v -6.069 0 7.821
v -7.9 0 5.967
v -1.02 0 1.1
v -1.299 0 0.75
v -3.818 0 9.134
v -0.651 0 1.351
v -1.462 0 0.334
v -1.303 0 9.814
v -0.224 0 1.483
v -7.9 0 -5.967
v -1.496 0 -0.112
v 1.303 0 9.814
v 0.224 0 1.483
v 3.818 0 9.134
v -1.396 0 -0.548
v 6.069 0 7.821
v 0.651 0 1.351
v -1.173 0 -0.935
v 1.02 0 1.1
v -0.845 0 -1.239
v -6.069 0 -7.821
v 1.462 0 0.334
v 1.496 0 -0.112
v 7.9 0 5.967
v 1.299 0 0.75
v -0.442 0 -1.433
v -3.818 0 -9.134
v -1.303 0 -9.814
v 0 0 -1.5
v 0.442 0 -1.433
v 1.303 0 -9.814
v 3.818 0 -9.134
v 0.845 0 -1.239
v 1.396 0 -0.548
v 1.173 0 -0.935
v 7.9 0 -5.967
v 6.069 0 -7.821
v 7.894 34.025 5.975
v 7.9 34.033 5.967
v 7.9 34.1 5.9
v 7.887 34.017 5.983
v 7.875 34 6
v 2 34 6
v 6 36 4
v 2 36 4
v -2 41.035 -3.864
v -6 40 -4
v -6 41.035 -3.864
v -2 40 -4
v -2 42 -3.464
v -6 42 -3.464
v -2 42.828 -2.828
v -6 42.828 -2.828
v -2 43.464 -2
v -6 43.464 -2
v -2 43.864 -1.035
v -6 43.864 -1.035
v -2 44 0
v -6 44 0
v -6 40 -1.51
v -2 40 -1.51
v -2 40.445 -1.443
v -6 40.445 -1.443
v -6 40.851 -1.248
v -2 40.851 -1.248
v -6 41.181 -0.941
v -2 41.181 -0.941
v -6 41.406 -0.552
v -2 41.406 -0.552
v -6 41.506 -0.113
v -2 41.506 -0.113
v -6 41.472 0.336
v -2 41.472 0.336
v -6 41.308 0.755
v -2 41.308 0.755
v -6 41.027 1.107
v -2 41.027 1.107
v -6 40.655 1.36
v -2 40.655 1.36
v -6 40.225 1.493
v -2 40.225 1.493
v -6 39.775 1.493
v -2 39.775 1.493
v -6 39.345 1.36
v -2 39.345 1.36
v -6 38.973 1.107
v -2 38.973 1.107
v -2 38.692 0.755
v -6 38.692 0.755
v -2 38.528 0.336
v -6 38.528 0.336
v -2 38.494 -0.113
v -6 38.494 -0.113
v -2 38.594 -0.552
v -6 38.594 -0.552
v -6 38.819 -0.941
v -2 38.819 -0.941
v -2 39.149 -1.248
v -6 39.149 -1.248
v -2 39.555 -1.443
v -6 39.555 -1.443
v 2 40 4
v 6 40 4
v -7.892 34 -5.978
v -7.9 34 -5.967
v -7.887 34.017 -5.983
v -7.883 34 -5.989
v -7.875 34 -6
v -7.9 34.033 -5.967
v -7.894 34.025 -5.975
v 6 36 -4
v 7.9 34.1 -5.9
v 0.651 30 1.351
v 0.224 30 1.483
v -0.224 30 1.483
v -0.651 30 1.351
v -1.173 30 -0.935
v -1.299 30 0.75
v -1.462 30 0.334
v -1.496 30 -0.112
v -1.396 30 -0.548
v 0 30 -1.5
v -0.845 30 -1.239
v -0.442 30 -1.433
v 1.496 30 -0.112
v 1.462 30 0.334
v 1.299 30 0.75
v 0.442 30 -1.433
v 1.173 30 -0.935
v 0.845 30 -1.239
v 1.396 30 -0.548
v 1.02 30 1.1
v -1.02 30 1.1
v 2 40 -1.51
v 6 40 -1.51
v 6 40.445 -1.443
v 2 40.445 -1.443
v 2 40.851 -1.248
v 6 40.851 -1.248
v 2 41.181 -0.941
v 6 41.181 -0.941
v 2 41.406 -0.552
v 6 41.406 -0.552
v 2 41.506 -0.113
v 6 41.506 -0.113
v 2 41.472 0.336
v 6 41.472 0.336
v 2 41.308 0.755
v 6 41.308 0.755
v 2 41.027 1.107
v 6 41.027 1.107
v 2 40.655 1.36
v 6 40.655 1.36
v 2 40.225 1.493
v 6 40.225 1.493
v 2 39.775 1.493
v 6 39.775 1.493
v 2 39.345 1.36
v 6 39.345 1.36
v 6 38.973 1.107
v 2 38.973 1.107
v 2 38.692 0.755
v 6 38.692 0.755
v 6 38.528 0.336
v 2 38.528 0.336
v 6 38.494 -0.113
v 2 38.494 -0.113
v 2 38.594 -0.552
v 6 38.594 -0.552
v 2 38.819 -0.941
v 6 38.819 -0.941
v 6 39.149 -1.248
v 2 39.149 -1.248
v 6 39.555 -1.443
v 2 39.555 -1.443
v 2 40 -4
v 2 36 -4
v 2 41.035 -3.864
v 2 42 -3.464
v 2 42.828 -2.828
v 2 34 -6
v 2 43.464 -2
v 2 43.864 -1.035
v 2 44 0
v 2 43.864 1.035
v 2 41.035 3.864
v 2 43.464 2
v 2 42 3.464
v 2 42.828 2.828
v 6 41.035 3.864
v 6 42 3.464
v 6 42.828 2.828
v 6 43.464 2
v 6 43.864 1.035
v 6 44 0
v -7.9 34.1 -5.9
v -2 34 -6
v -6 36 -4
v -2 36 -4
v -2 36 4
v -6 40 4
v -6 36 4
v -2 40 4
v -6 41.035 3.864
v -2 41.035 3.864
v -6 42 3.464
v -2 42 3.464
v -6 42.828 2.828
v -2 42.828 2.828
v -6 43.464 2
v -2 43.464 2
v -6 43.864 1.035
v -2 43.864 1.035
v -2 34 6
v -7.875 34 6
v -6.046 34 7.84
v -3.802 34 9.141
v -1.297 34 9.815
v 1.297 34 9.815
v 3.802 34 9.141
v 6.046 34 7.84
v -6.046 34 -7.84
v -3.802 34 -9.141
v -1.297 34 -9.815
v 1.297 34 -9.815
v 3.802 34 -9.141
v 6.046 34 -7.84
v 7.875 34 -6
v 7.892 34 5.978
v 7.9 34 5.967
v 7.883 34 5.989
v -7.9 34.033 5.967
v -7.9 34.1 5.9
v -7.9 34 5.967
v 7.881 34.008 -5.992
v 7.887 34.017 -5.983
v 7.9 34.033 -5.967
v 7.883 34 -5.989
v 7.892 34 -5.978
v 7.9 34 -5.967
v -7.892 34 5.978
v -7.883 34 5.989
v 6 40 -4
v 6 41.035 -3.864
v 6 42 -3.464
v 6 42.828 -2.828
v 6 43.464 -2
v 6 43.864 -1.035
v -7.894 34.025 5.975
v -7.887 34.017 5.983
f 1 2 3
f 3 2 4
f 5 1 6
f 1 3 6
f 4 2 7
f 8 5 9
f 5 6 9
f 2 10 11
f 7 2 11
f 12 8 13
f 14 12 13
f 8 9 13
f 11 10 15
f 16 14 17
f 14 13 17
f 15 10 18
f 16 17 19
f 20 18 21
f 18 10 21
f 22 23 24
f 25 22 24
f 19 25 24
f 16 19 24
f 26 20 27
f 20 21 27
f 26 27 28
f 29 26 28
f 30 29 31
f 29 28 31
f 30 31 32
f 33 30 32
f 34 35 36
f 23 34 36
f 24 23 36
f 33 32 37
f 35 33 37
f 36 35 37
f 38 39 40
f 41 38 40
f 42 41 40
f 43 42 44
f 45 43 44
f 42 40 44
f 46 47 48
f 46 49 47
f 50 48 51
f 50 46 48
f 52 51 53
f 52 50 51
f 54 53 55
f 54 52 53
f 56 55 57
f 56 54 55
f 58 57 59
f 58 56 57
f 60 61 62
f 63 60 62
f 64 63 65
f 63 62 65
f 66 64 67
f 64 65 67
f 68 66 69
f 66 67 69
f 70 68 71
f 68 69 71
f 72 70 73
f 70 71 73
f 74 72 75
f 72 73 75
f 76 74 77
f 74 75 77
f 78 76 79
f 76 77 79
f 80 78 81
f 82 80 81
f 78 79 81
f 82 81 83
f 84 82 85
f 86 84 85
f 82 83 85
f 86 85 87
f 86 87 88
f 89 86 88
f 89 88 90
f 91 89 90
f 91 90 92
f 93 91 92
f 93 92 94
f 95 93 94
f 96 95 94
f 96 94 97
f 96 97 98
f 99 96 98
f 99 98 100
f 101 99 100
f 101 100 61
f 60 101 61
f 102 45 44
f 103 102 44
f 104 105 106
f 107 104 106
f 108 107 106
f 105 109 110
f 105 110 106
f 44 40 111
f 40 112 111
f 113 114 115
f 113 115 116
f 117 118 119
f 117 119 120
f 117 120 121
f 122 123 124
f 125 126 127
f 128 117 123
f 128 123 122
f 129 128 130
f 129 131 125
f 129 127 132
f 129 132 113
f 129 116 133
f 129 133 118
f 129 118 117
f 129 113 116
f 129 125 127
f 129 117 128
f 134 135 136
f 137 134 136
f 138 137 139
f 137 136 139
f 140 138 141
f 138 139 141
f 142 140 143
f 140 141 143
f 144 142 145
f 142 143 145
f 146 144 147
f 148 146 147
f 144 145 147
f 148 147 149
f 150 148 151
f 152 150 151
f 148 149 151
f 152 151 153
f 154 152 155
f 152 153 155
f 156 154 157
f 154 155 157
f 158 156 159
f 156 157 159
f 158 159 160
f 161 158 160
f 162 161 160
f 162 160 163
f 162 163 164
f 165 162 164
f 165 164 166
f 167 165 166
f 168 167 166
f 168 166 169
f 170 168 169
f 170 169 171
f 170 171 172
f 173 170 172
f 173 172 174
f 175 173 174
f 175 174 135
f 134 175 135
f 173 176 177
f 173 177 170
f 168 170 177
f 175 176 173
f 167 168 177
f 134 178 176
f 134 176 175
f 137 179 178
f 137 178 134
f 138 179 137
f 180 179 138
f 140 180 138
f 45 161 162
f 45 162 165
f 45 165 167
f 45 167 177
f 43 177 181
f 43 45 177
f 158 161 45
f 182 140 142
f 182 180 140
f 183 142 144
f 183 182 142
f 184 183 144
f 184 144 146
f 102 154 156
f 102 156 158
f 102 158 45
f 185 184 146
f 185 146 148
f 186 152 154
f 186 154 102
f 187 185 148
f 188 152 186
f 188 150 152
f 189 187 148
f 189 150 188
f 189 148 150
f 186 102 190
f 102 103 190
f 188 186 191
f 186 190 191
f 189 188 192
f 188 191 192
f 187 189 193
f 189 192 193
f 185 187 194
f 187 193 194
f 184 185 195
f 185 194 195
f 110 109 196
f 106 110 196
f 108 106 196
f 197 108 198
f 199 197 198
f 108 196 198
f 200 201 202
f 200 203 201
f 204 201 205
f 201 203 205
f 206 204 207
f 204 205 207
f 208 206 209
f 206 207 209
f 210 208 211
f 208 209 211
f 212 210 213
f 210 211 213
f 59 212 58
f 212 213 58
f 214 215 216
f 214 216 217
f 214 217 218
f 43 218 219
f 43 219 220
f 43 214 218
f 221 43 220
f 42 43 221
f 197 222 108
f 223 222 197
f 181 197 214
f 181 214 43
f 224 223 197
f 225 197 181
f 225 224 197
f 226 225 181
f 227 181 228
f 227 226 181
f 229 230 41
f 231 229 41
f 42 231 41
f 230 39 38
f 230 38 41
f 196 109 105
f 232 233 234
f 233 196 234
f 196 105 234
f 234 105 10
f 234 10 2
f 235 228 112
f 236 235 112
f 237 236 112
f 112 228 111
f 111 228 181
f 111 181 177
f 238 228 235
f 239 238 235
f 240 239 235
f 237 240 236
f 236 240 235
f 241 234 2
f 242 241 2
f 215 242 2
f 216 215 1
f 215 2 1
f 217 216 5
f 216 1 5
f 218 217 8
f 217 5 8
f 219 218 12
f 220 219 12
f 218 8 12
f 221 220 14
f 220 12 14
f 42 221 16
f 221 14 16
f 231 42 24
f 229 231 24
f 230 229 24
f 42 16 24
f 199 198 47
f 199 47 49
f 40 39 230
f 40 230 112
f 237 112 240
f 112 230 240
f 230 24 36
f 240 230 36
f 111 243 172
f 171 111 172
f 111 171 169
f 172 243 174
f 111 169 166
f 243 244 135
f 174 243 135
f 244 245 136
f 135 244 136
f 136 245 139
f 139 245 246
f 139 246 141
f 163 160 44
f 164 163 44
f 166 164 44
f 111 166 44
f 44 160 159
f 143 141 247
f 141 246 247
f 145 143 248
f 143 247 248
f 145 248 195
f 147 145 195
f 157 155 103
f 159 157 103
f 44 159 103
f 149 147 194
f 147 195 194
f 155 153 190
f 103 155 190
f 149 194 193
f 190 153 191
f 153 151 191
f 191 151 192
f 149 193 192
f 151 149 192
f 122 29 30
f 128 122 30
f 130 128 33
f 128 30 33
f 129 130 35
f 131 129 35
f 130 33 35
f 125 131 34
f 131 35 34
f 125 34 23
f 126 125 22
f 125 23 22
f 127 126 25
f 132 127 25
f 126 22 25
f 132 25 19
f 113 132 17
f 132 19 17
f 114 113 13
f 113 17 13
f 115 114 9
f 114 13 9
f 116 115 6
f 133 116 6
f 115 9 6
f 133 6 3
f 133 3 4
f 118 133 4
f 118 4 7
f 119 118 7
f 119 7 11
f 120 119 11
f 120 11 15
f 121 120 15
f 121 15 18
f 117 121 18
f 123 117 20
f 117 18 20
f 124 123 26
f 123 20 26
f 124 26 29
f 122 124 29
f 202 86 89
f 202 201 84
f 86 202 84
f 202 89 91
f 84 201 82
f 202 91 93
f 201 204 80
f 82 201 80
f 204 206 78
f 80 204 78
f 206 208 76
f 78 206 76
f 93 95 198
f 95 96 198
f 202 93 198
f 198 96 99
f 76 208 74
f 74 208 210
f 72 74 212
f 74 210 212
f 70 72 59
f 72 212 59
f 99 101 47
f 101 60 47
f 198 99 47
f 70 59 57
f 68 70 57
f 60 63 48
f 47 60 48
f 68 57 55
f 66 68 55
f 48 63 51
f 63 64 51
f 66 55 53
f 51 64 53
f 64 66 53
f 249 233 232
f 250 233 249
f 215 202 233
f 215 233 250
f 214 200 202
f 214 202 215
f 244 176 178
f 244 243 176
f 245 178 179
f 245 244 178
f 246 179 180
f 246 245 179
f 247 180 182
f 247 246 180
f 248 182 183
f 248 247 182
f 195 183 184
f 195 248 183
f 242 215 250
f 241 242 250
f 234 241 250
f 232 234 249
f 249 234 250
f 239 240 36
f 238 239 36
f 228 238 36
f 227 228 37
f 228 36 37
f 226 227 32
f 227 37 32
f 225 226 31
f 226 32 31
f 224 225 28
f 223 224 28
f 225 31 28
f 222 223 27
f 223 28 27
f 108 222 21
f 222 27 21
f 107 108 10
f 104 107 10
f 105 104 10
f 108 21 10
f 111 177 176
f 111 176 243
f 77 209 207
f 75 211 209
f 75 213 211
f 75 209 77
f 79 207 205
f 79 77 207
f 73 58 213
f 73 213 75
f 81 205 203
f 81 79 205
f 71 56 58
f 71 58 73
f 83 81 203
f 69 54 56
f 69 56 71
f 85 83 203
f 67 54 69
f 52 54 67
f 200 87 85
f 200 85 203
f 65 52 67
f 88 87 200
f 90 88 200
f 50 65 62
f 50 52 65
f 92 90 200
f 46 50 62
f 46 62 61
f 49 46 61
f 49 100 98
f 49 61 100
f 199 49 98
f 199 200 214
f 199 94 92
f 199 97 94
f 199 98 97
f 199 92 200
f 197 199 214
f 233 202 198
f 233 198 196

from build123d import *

# Parameters (mm, degrees)
BOSS_EXTRUDE1_DEPTH = 34
SKETCH7_W           = 4
SKETCH7_H           = 8
BOSS_EXTRUDE3_DEPTH = 10
SKETCH9_R           = 1.51
CUT_EXTRUDE5_DEPTH  = 48.193431746
FILLET2_R           = 4
SKETCH16_R          = 1.5
CUT_EXTRUDE7_DEPTH  = 30
CHAMFER1_SIZE       = 2


# Some blends are built 0.0001 mm under size
with BuildPart() as part:
    # Sketch1 → Boss-Extrude1 (new body)
    with BuildSketch(Plane(origin=(0, 0, 0), x_dir=(1, 0, 0), z_dir=(0, 1, 0))):
        with BuildLine():
            Line((-7.9, 5.966573556), (-7.9, -5.966573556))
            ThreePointArc((-7.9, -5.966573556), (0, -9.9), (7.9, -5.966573556))
            Line((7.9, -5.966573556), (7.9, 5.966573556))
            ThreePointArc((7.9, 5.966573556), (0, 9.9), (-7.9, 5.966573556))
        make_face()
    extrude(amount=BOSS_EXTRUDE1_DEPTH)

    # Sketch7 → Boss-Extrude3 (add)
    with BuildSketch(Plane(origin=(0, 34, 0), x_dir=(1, 0, 0), z_dir=(0, 1, 0))):
        with Locations((-4, 0)):
            Rectangle(SKETCH7_W, SKETCH7_H)
        with Locations((4, 0)):
            Rectangle(SKETCH7_W, SKETCH7_H)
    extrude(amount=BOSS_EXTRUDE3_DEPTH)

    # Sketch9 → Cut-Extrude5 (cut, through all)
    with BuildSketch(Plane(origin=(6, 0, 0), x_dir=(0, 0, -1), z_dir=(1, 0, 0))):
        with Locations((0, 40)):
            Circle(SKETCH9_R)
    extrude(amount=-CUT_EXTRUDE5_DEPTH, mode=Mode.SUBTRACT)

    # Fillet2
    fillet2_edges = [part.edges().sort_by_distance(p)[0] for p in [
        (4, 44, 4),
        (4, 44, -4),
        (-4, 44, -4),
        (-4, 44, 4),
    ]]
    fillet(fillet2_edges, radius=FILLET2_R - 0.0001)  # a hair under: the kernel refuses the full size

    # Sketch16 → Cut-Extrude7 (cut)
    with BuildSketch(Plane.XZ):
        with Locations(Location((0, 0, 0), (0, 0, 270))):
            Circle(SKETCH16_R)
    extrude(amount=-CUT_EXTRUDE7_DEPTH, mode=Mode.SUBTRACT)

    # Chamfer1
    # the kernel refuses this chamfer: 2 mm, written as the material it adds along each edge
    with BuildSketch(Plane(origin=(-6, 34, -4), x_dir=(0, -0.027495876610585623, -0.9996219169112968), z_dir=(1, 0, 0)), Plane(origin=(2, 34, -4), x_dir=(0, -0.027495876610585623, -0.9996219169112968), z_dir=(1, 0, 0)), Plane(origin=(6, 34, 4), x_dir=(0, -0.027495876610585623, 0.9996219169112968), z_dir=(-1, 0, 0))) as chamfer1_piece_1:
        Polygon((CHAMFER1_SIZE * 0.999621916911, CHAMFER1_SIZE * 0.0274958766106), (-CHAMFER1_SIZE * 0.0274958766106, CHAMFER1_SIZE * 0.999621916911), (0, 0), align=None)
    extrude(amount=4)
    with BuildSketch(Plane(origin=(-6, 34, -4), x_dir=(0, -0.027495876610585623, -0.9996219169112968), z_dir=(1, 0, 0))) as chamfer1_piece_2_section:
        Polygon((CHAMFER1_SIZE * 0.999621916911, CHAMFER1_SIZE * 0.0274958766106), (-CHAMFER1_SIZE * 0.0274958766106, CHAMFER1_SIZE * 0.999621916911), (0, 0), align=None)
    chamfer1_piece_2 = extrude(amount=9.143365976, mode=Mode.PRIVATE)
    chamfer1_piece_2 = split(chamfer1_piece_2, bisect_by=Plane(origin=(2, 34.659587254, -4.659587254), z_dir=(1, 0, 0)), keep=Keep.TOP, mode=Mode.PRIVATE)
    add(chamfer1_piece_2)
    with BuildSketch(Plane(origin=(-6, 34, 4), x_dir=(0.02749587661058651, 0.9996219169112968, 0), z_dir=(0, 0, -1))) as chamfer1_piece_3_section:
        Polygon((CHAMFER1_SIZE * 0.999621916911, -CHAMFER1_SIZE * 0.0274958766106), (-CHAMFER1_SIZE * 0.0274958766106, -CHAMFER1_SIZE * 0.999621916911), (0, 0), align=None)
    chamfer1_piece_3 = extrude(amount=8, mode=Mode.PRIVATE)
    chamfer1_piece_3 = split(chamfer1_piece_3, bisect_by=Plane(origin=(-7.9, 34.66508919, 0), z_dir=(1, 0, 0)), keep=Keep.TOP, mode=Mode.PRIVATE)
    add(chamfer1_piece_3)
    with BuildSketch(Plane(origin=(3.143365976, 34, 4), x_dir=(0, 0.9996219169112968, -0.027495876610586296), z_dir=(-1, 0, 0))) as chamfer1_piece_4_section:
        Polygon((CHAMFER1_SIZE * 0.999621916911, -CHAMFER1_SIZE * 0.0274958766106), (-CHAMFER1_SIZE * 0.0274958766106, -CHAMFER1_SIZE * 0.999621916911), (0, 0), align=None)
    chamfer1_piece_4 = extrude(amount=9.143365976, mode=Mode.PRIVATE)
    chamfer1_piece_4 = split(chamfer1_piece_4, bisect_by=Plane(origin=(2, 34.659587254, 4.659587254), z_dir=(1, 0, 0)), keep=Keep.TOP, mode=Mode.PRIVATE)
    add(chamfer1_piece_4)
    with BuildSketch(Plane(origin=(-2, 34, 4), x_dir=(0, 0.9996219169112968, -0.027495876610586296), z_dir=(-1, 0, 0))) as chamfer1_piece_5:
        Polygon((CHAMFER1_SIZE * 0.999621916911, -CHAMFER1_SIZE * 0.0274958766106), (-CHAMFER1_SIZE * 0.0274958766106, -CHAMFER1_SIZE * 0.999621916911), (0, 0), align=None)
    extrude(amount=4)
    with BuildSketch(Plane(origin=(-3.143365976, 34, -4), x_dir=(0, -0.027495876610585623, -0.9996219169112968), z_dir=(1, 0, 0))) as chamfer1_piece_6_section:
        Polygon((CHAMFER1_SIZE * 0.999621916911, CHAMFER1_SIZE * 0.0274958766106), (-CHAMFER1_SIZE * 0.0274958766106, CHAMFER1_SIZE * 0.999621916911), (0, 0), align=None)
    chamfer1_piece_6 = extrude(amount=9.143365976, mode=Mode.PRIVATE)
    chamfer1_piece_6 = split(chamfer1_piece_6, bisect_by=Plane(origin=(-2, 34.659587254, -4.659587254), z_dir=(-1, 0, 0)), keep=Keep.TOP, mode=Mode.PRIVATE)
    add(chamfer1_piece_6)
    with BuildSketch(Plane(origin=(6, 34, 4), x_dir=(0, -0.027495876610585623, 0.9996219169112968), z_dir=(-1, 0, 0))) as chamfer1_piece_7_section:
        Polygon((CHAMFER1_SIZE * 0.999621916911, CHAMFER1_SIZE * 0.0274958766106), (-CHAMFER1_SIZE * 0.0274958766106, CHAMFER1_SIZE * 0.999621916911), (0, 0), align=None)
    chamfer1_piece_7 = extrude(amount=9.143365976, mode=Mode.PRIVATE)
    chamfer1_piece_7 = split(chamfer1_piece_7, bisect_by=Plane(origin=(-2, 34.659587254, 4.659587254), z_dir=(-1, 0, 0)), keep=Keep.TOP, mode=Mode.PRIVATE)
    add(chamfer1_piece_7)
    with BuildSketch(Plane(origin=(6, 34, -4), x_dir=(0.9996219169112968, -0.027495876610585623, 0), z_dir=(0, 0, 1))) as chamfer1_piece_8_section:
        Polygon((CHAMFER1_SIZE * 0.999621916911, CHAMFER1_SIZE * 0.0274958766106), (-CHAMFER1_SIZE * 0.0274958766106, CHAMFER1_SIZE * 0.999621916911), (0, 0), align=None)
    chamfer1_piece_8 = extrude(amount=8, mode=Mode.PRIVATE)
    chamfer1_piece_8 = split(chamfer1_piece_8, bisect_by=Plane(origin=(7.9, 34.66508919, 0), z_dir=(-1, 0, 0)), keep=Keep.TOP, mode=Mode.PRIVATE)
    add(chamfer1_piece_8)
    with BuildSketch(Plane(origin=(-6, 34, 4), x_dir=(0.02749587661058651, 0.9996219169112968, 0), z_dir=(0, 0, -1))) as chamfer1_piece_9a_section:
        Polygon((CHAMFER1_SIZE * 0.999621916911, -CHAMFER1_SIZE * 0.0274958766106), (-CHAMFER1_SIZE * 0.0274958766106, -CHAMFER1_SIZE * 0.999621916911), (0, 0), align=None)
    chamfer1_piece_9a = extrude(amount=13.143365976, mode=Mode.PRIVATE)
    chamfer1_piece_9a = split(chamfer1_piece_9a, bisect_by=Plane(origin=(-6.579477658, 34.702229701, -4), z_dir=(0, 0, -1)), keep=Keep.TOP, mode=Mode.PRIVATE)
    chamfer1_piece_9a = chamfer1_piece_9a & Plane(origin=(0, 34.702229701, 0), x_dir=(-0.7979797979797981, 0, 0.6026841975828805), z_dir=(0, -1, 0)) * Cylinder(9.9, 35, mode=Mode.PRIVATE)
    chamfer1_piece_9a = split(chamfer1_piece_9a, bisect_by=Plane(origin=(-7.9, 34.702229701, -5.684853753), z_dir=(1, 0, 0)), keep=Keep.TOP, mode=Mode.PRIVATE)
    with BuildSketch(Plane(origin=(-11.143365976, 34, -4), x_dir=(0, -0.027495876610585623, -0.9996219169112968), z_dir=(1, 0, 0))) as chamfer1_piece_9b_section:
        Polygon((CHAMFER1_SIZE * 0.999621916911, CHAMFER1_SIZE * 0.0274958766106), (-CHAMFER1_SIZE * 0.0274958766106, CHAMFER1_SIZE * 0.999621916911), (0, 0), align=None)
    chamfer1_piece_9b = extrude(amount=9.143365976, mode=Mode.PRIVATE)
    chamfer1_piece_9b = split(chamfer1_piece_9b, bisect_by=Plane(origin=(-6, 34.659622918, -4.659519528), z_dir=(-1, 0, 0)), keep=Keep.TOP, mode=Mode.PRIVATE)
    chamfer1_piece_9b = split(chamfer1_piece_9b, bisect_by=Plane(origin=(-7.9, 34.659622918, -4.659519528), z_dir=(1, 0, 0)), keep=Keep.TOP, mode=Mode.PRIVATE)
    chamfer1_piece_9b = chamfer1_piece_9b & Plane(origin=(0, 34.659622918, 0), x_dir=(0.7979797979797981, 0, -0.6026841975828805), z_dir=(0, -1, 0)) * Cylinder(9.9, 27, mode=Mode.PRIVATE)
    chamfer1_piece_9 = chamfer1_piece_9a & chamfer1_piece_9b
    add(chamfer1_piece_9)
    with BuildSketch(Plane(origin=(-6, 34, 9.143365976), x_dir=(0.02749587661058651, 0.9996219169112968, 0), z_dir=(0, 0, -1))) as chamfer1_piece_10a_section:
        Polygon((CHAMFER1_SIZE * 0.999621916911, -CHAMFER1_SIZE * 0.0274958766106), (-CHAMFER1_SIZE * 0.0274958766106, -CHAMFER1_SIZE * 0.999621916911), (0, 0), align=None)
    chamfer1_piece_10a = extrude(amount=13.143365976, mode=Mode.PRIVATE)
    chamfer1_piece_10a = split(chamfer1_piece_10a, bisect_by=Plane(origin=(-6.579477657, 34.702229707, 4), z_dir=(0, 0, 1)), keep=Keep.TOP, mode=Mode.PRIVATE)
    chamfer1_piece_10a = chamfer1_piece_10a & Plane(origin=(0, 34.702229707, 0), x_dir=(-0.7979797979797981, 0, 0.6026841975828805), z_dir=(0, -1, 0)) * Cylinder(9.9, 35, mode=Mode.PRIVATE)
    chamfer1_piece_10a = split(chamfer1_piece_10a, bisect_by=Plane(origin=(-7.9, 34.702229707, 5.684853748), z_dir=(1, 0, 0)), keep=Keep.TOP, mode=Mode.PRIVATE)
    with BuildSketch(Plane(origin=(-2, 34, 4), x_dir=(0, 0.9996219169112968, -0.027495876610586296), z_dir=(-1, 0, 0))) as chamfer1_piece_10b_section:
        Polygon((CHAMFER1_SIZE * 0.999621916911, -CHAMFER1_SIZE * 0.0274958766106), (-CHAMFER1_SIZE * 0.0274958766106, -CHAMFER1_SIZE * 0.999621916911), (0, 0), align=None)
    chamfer1_piece_10b = extrude(amount=9.143365976, mode=Mode.PRIVATE)
    chamfer1_piece_10b = split(chamfer1_piece_10b, bisect_by=Plane(origin=(-6, 34.659622918, 4.659519528), z_dir=(-1, 0, 0)), keep=Keep.TOP, mode=Mode.PRIVATE)
    chamfer1_piece_10b = chamfer1_piece_10b & Plane(origin=(0, 34.659622918, 0), x_dir=(-0.7979797979797981, 0, 0.6026841975828805), z_dir=(0, -1, 0)) * Cylinder(9.9, 27, mode=Mode.PRIVATE)
    chamfer1_piece_10b = split(chamfer1_piece_10b, bisect_by=Plane(origin=(-7.9, 34.659622918, 4.659519528), z_dir=(1, 0, 0)), keep=Keep.TOP, mode=Mode.PRIVATE)
    chamfer1_piece_10 = chamfer1_piece_10a & chamfer1_piece_10b
    add(chamfer1_piece_10)
    with BuildSketch(Plane(origin=(6, 34, -9.143365976), x_dir=(0.9996219169112968, -0.027495876610585623, 0), z_dir=(0, 0, 1))) as chamfer1_piece_11a_section:
        Polygon((CHAMFER1_SIZE * 0.999621916911, CHAMFER1_SIZE * 0.0274958766106), (-CHAMFER1_SIZE * 0.0274958766106, CHAMFER1_SIZE * 0.999621916911), (0, 0), align=None)
    chamfer1_piece_11a = extrude(amount=13.143365976, mode=Mode.PRIVATE)
    chamfer1_piece_11a = chamfer1_piece_11a & Plane(origin=(0, 34.702229706, 0), x_dir=(-0.7979797979797981, 0, 0.6026841975828805), z_dir=(0, -1, 0)) * Cylinder(9.9, 35, mode=Mode.PRIVATE)
    chamfer1_piece_11a = split(chamfer1_piece_11a, bisect_by=Plane(origin=(7.9, 34.702229706, -5.684853749), z_dir=(-1, 0, 0)), keep=Keep.TOP, mode=Mode.PRIVATE)
    chamfer1_piece_11a = split(chamfer1_piece_11a, bisect_by=Plane(origin=(6.579477658, 34.702229706, -4), z_dir=(0, 0, -1)), keep=Keep.TOP, mode=Mode.PRIVATE)
    with BuildSketch(Plane(origin=(2, 34, -4), x_dir=(0, -0.027495876610585623, -0.9996219169112968), z_dir=(1, 0, 0))) as chamfer1_piece_11b_section:
        Polygon((CHAMFER1_SIZE * 0.999621916911, CHAMFER1_SIZE * 0.0274958766106), (-CHAMFER1_SIZE * 0.0274958766106, CHAMFER1_SIZE * 0.999621916911), (0, 0), align=None)
    chamfer1_piece_11b = extrude(amount=9.143365976, mode=Mode.PRIVATE)
    chamfer1_piece_11b = split(chamfer1_piece_11b, bisect_by=Plane(origin=(7.9, 34.659622918, -4.659519528), z_dir=(-1, 0, 0)), keep=Keep.TOP, mode=Mode.PRIVATE)
    chamfer1_piece_11b = chamfer1_piece_11b & Plane(origin=(0, 34.659622918, 0), x_dir=(0.7979797979797981, 0, -0.6026841975828805), z_dir=(0, -1, 0)) * Cylinder(9.9, 27, mode=Mode.PRIVATE)
    chamfer1_piece_11b = split(chamfer1_piece_11b, bisect_by=Plane(origin=(6, 34.659622918, -4.659519528), z_dir=(1, 0, 0)), keep=Keep.TOP, mode=Mode.PRIVATE)
    chamfer1_piece_11 = chamfer1_piece_11a & chamfer1_piece_11b
    add(chamfer1_piece_11)
    with BuildSketch(Plane(origin=(11.143365976, 34, 4), x_dir=(0, -0.027495876610585623, 0.9996219169112968), z_dir=(-1, 0, 0))) as chamfer1_piece_12a_section:
        Polygon((CHAMFER1_SIZE * 0.999621916911, CHAMFER1_SIZE * 0.0274958766106), (-CHAMFER1_SIZE * 0.0274958766106, CHAMFER1_SIZE * 0.999621916911), (0, 0), align=None)
    chamfer1_piece_12a = extrude(amount=9.143365976, mode=Mode.PRIVATE)
    chamfer1_piece_12a = chamfer1_piece_12a & Plane(origin=(0, 34.659622918, 0), x_dir=(-0.7979797979797981, 0, 0.6026841975828805), z_dir=(0, -1, 0)) * Cylinder(9.9, 27, mode=Mode.PRIVATE)
    chamfer1_piece_12a = split(chamfer1_piece_12a, bisect_by=Plane(origin=(7.9, 34.659622918, 4.659519528), z_dir=(-1, 0, 0)), keep=Keep.TOP, mode=Mode.PRIVATE)
    chamfer1_piece_12a = split(chamfer1_piece_12a, bisect_by=Plane(origin=(6, 34.659622918, 4.659519528), z_dir=(1, 0, 0)), keep=Keep.TOP, mode=Mode.PRIVATE)
    with BuildSketch(Plane(origin=(6, 34, -4), x_dir=(0.9996219169112968, -0.027495876610585623, 0), z_dir=(0, 0, 1))) as chamfer1_piece_12b_section:
        Polygon((CHAMFER1_SIZE * 0.999621916911, CHAMFER1_SIZE * 0.0274958766106), (-CHAMFER1_SIZE * 0.0274958766106, CHAMFER1_SIZE * 0.999621916911), (0, 0), align=None)
    chamfer1_piece_12b = extrude(amount=13.143365976, mode=Mode.PRIVATE)
    chamfer1_piece_12b = chamfer1_piece_12b & Plane(origin=(0, 34.702229701, 0), x_dir=(-0.7979797979797981, 0, 0.6026841975828805), z_dir=(0, -1, 0)) * Cylinder(9.9, 35, mode=Mode.PRIVATE)
    chamfer1_piece_12b = split(chamfer1_piece_12b, bisect_by=Plane(origin=(7.9, 34.702229701, 5.684853753), z_dir=(-1, 0, 0)), keep=Keep.TOP, mode=Mode.PRIVATE)
    chamfer1_piece_12b = split(chamfer1_piece_12b, bisect_by=Plane(origin=(6.579477658, 34.702229701, 4), z_dir=(0, 0, 1)), keep=Keep.TOP, mode=Mode.PRIVATE)
    chamfer1_piece_12 = chamfer1_piece_12a & chamfer1_piece_12b
    add(chamfer1_piece_12)


solid = part.part
